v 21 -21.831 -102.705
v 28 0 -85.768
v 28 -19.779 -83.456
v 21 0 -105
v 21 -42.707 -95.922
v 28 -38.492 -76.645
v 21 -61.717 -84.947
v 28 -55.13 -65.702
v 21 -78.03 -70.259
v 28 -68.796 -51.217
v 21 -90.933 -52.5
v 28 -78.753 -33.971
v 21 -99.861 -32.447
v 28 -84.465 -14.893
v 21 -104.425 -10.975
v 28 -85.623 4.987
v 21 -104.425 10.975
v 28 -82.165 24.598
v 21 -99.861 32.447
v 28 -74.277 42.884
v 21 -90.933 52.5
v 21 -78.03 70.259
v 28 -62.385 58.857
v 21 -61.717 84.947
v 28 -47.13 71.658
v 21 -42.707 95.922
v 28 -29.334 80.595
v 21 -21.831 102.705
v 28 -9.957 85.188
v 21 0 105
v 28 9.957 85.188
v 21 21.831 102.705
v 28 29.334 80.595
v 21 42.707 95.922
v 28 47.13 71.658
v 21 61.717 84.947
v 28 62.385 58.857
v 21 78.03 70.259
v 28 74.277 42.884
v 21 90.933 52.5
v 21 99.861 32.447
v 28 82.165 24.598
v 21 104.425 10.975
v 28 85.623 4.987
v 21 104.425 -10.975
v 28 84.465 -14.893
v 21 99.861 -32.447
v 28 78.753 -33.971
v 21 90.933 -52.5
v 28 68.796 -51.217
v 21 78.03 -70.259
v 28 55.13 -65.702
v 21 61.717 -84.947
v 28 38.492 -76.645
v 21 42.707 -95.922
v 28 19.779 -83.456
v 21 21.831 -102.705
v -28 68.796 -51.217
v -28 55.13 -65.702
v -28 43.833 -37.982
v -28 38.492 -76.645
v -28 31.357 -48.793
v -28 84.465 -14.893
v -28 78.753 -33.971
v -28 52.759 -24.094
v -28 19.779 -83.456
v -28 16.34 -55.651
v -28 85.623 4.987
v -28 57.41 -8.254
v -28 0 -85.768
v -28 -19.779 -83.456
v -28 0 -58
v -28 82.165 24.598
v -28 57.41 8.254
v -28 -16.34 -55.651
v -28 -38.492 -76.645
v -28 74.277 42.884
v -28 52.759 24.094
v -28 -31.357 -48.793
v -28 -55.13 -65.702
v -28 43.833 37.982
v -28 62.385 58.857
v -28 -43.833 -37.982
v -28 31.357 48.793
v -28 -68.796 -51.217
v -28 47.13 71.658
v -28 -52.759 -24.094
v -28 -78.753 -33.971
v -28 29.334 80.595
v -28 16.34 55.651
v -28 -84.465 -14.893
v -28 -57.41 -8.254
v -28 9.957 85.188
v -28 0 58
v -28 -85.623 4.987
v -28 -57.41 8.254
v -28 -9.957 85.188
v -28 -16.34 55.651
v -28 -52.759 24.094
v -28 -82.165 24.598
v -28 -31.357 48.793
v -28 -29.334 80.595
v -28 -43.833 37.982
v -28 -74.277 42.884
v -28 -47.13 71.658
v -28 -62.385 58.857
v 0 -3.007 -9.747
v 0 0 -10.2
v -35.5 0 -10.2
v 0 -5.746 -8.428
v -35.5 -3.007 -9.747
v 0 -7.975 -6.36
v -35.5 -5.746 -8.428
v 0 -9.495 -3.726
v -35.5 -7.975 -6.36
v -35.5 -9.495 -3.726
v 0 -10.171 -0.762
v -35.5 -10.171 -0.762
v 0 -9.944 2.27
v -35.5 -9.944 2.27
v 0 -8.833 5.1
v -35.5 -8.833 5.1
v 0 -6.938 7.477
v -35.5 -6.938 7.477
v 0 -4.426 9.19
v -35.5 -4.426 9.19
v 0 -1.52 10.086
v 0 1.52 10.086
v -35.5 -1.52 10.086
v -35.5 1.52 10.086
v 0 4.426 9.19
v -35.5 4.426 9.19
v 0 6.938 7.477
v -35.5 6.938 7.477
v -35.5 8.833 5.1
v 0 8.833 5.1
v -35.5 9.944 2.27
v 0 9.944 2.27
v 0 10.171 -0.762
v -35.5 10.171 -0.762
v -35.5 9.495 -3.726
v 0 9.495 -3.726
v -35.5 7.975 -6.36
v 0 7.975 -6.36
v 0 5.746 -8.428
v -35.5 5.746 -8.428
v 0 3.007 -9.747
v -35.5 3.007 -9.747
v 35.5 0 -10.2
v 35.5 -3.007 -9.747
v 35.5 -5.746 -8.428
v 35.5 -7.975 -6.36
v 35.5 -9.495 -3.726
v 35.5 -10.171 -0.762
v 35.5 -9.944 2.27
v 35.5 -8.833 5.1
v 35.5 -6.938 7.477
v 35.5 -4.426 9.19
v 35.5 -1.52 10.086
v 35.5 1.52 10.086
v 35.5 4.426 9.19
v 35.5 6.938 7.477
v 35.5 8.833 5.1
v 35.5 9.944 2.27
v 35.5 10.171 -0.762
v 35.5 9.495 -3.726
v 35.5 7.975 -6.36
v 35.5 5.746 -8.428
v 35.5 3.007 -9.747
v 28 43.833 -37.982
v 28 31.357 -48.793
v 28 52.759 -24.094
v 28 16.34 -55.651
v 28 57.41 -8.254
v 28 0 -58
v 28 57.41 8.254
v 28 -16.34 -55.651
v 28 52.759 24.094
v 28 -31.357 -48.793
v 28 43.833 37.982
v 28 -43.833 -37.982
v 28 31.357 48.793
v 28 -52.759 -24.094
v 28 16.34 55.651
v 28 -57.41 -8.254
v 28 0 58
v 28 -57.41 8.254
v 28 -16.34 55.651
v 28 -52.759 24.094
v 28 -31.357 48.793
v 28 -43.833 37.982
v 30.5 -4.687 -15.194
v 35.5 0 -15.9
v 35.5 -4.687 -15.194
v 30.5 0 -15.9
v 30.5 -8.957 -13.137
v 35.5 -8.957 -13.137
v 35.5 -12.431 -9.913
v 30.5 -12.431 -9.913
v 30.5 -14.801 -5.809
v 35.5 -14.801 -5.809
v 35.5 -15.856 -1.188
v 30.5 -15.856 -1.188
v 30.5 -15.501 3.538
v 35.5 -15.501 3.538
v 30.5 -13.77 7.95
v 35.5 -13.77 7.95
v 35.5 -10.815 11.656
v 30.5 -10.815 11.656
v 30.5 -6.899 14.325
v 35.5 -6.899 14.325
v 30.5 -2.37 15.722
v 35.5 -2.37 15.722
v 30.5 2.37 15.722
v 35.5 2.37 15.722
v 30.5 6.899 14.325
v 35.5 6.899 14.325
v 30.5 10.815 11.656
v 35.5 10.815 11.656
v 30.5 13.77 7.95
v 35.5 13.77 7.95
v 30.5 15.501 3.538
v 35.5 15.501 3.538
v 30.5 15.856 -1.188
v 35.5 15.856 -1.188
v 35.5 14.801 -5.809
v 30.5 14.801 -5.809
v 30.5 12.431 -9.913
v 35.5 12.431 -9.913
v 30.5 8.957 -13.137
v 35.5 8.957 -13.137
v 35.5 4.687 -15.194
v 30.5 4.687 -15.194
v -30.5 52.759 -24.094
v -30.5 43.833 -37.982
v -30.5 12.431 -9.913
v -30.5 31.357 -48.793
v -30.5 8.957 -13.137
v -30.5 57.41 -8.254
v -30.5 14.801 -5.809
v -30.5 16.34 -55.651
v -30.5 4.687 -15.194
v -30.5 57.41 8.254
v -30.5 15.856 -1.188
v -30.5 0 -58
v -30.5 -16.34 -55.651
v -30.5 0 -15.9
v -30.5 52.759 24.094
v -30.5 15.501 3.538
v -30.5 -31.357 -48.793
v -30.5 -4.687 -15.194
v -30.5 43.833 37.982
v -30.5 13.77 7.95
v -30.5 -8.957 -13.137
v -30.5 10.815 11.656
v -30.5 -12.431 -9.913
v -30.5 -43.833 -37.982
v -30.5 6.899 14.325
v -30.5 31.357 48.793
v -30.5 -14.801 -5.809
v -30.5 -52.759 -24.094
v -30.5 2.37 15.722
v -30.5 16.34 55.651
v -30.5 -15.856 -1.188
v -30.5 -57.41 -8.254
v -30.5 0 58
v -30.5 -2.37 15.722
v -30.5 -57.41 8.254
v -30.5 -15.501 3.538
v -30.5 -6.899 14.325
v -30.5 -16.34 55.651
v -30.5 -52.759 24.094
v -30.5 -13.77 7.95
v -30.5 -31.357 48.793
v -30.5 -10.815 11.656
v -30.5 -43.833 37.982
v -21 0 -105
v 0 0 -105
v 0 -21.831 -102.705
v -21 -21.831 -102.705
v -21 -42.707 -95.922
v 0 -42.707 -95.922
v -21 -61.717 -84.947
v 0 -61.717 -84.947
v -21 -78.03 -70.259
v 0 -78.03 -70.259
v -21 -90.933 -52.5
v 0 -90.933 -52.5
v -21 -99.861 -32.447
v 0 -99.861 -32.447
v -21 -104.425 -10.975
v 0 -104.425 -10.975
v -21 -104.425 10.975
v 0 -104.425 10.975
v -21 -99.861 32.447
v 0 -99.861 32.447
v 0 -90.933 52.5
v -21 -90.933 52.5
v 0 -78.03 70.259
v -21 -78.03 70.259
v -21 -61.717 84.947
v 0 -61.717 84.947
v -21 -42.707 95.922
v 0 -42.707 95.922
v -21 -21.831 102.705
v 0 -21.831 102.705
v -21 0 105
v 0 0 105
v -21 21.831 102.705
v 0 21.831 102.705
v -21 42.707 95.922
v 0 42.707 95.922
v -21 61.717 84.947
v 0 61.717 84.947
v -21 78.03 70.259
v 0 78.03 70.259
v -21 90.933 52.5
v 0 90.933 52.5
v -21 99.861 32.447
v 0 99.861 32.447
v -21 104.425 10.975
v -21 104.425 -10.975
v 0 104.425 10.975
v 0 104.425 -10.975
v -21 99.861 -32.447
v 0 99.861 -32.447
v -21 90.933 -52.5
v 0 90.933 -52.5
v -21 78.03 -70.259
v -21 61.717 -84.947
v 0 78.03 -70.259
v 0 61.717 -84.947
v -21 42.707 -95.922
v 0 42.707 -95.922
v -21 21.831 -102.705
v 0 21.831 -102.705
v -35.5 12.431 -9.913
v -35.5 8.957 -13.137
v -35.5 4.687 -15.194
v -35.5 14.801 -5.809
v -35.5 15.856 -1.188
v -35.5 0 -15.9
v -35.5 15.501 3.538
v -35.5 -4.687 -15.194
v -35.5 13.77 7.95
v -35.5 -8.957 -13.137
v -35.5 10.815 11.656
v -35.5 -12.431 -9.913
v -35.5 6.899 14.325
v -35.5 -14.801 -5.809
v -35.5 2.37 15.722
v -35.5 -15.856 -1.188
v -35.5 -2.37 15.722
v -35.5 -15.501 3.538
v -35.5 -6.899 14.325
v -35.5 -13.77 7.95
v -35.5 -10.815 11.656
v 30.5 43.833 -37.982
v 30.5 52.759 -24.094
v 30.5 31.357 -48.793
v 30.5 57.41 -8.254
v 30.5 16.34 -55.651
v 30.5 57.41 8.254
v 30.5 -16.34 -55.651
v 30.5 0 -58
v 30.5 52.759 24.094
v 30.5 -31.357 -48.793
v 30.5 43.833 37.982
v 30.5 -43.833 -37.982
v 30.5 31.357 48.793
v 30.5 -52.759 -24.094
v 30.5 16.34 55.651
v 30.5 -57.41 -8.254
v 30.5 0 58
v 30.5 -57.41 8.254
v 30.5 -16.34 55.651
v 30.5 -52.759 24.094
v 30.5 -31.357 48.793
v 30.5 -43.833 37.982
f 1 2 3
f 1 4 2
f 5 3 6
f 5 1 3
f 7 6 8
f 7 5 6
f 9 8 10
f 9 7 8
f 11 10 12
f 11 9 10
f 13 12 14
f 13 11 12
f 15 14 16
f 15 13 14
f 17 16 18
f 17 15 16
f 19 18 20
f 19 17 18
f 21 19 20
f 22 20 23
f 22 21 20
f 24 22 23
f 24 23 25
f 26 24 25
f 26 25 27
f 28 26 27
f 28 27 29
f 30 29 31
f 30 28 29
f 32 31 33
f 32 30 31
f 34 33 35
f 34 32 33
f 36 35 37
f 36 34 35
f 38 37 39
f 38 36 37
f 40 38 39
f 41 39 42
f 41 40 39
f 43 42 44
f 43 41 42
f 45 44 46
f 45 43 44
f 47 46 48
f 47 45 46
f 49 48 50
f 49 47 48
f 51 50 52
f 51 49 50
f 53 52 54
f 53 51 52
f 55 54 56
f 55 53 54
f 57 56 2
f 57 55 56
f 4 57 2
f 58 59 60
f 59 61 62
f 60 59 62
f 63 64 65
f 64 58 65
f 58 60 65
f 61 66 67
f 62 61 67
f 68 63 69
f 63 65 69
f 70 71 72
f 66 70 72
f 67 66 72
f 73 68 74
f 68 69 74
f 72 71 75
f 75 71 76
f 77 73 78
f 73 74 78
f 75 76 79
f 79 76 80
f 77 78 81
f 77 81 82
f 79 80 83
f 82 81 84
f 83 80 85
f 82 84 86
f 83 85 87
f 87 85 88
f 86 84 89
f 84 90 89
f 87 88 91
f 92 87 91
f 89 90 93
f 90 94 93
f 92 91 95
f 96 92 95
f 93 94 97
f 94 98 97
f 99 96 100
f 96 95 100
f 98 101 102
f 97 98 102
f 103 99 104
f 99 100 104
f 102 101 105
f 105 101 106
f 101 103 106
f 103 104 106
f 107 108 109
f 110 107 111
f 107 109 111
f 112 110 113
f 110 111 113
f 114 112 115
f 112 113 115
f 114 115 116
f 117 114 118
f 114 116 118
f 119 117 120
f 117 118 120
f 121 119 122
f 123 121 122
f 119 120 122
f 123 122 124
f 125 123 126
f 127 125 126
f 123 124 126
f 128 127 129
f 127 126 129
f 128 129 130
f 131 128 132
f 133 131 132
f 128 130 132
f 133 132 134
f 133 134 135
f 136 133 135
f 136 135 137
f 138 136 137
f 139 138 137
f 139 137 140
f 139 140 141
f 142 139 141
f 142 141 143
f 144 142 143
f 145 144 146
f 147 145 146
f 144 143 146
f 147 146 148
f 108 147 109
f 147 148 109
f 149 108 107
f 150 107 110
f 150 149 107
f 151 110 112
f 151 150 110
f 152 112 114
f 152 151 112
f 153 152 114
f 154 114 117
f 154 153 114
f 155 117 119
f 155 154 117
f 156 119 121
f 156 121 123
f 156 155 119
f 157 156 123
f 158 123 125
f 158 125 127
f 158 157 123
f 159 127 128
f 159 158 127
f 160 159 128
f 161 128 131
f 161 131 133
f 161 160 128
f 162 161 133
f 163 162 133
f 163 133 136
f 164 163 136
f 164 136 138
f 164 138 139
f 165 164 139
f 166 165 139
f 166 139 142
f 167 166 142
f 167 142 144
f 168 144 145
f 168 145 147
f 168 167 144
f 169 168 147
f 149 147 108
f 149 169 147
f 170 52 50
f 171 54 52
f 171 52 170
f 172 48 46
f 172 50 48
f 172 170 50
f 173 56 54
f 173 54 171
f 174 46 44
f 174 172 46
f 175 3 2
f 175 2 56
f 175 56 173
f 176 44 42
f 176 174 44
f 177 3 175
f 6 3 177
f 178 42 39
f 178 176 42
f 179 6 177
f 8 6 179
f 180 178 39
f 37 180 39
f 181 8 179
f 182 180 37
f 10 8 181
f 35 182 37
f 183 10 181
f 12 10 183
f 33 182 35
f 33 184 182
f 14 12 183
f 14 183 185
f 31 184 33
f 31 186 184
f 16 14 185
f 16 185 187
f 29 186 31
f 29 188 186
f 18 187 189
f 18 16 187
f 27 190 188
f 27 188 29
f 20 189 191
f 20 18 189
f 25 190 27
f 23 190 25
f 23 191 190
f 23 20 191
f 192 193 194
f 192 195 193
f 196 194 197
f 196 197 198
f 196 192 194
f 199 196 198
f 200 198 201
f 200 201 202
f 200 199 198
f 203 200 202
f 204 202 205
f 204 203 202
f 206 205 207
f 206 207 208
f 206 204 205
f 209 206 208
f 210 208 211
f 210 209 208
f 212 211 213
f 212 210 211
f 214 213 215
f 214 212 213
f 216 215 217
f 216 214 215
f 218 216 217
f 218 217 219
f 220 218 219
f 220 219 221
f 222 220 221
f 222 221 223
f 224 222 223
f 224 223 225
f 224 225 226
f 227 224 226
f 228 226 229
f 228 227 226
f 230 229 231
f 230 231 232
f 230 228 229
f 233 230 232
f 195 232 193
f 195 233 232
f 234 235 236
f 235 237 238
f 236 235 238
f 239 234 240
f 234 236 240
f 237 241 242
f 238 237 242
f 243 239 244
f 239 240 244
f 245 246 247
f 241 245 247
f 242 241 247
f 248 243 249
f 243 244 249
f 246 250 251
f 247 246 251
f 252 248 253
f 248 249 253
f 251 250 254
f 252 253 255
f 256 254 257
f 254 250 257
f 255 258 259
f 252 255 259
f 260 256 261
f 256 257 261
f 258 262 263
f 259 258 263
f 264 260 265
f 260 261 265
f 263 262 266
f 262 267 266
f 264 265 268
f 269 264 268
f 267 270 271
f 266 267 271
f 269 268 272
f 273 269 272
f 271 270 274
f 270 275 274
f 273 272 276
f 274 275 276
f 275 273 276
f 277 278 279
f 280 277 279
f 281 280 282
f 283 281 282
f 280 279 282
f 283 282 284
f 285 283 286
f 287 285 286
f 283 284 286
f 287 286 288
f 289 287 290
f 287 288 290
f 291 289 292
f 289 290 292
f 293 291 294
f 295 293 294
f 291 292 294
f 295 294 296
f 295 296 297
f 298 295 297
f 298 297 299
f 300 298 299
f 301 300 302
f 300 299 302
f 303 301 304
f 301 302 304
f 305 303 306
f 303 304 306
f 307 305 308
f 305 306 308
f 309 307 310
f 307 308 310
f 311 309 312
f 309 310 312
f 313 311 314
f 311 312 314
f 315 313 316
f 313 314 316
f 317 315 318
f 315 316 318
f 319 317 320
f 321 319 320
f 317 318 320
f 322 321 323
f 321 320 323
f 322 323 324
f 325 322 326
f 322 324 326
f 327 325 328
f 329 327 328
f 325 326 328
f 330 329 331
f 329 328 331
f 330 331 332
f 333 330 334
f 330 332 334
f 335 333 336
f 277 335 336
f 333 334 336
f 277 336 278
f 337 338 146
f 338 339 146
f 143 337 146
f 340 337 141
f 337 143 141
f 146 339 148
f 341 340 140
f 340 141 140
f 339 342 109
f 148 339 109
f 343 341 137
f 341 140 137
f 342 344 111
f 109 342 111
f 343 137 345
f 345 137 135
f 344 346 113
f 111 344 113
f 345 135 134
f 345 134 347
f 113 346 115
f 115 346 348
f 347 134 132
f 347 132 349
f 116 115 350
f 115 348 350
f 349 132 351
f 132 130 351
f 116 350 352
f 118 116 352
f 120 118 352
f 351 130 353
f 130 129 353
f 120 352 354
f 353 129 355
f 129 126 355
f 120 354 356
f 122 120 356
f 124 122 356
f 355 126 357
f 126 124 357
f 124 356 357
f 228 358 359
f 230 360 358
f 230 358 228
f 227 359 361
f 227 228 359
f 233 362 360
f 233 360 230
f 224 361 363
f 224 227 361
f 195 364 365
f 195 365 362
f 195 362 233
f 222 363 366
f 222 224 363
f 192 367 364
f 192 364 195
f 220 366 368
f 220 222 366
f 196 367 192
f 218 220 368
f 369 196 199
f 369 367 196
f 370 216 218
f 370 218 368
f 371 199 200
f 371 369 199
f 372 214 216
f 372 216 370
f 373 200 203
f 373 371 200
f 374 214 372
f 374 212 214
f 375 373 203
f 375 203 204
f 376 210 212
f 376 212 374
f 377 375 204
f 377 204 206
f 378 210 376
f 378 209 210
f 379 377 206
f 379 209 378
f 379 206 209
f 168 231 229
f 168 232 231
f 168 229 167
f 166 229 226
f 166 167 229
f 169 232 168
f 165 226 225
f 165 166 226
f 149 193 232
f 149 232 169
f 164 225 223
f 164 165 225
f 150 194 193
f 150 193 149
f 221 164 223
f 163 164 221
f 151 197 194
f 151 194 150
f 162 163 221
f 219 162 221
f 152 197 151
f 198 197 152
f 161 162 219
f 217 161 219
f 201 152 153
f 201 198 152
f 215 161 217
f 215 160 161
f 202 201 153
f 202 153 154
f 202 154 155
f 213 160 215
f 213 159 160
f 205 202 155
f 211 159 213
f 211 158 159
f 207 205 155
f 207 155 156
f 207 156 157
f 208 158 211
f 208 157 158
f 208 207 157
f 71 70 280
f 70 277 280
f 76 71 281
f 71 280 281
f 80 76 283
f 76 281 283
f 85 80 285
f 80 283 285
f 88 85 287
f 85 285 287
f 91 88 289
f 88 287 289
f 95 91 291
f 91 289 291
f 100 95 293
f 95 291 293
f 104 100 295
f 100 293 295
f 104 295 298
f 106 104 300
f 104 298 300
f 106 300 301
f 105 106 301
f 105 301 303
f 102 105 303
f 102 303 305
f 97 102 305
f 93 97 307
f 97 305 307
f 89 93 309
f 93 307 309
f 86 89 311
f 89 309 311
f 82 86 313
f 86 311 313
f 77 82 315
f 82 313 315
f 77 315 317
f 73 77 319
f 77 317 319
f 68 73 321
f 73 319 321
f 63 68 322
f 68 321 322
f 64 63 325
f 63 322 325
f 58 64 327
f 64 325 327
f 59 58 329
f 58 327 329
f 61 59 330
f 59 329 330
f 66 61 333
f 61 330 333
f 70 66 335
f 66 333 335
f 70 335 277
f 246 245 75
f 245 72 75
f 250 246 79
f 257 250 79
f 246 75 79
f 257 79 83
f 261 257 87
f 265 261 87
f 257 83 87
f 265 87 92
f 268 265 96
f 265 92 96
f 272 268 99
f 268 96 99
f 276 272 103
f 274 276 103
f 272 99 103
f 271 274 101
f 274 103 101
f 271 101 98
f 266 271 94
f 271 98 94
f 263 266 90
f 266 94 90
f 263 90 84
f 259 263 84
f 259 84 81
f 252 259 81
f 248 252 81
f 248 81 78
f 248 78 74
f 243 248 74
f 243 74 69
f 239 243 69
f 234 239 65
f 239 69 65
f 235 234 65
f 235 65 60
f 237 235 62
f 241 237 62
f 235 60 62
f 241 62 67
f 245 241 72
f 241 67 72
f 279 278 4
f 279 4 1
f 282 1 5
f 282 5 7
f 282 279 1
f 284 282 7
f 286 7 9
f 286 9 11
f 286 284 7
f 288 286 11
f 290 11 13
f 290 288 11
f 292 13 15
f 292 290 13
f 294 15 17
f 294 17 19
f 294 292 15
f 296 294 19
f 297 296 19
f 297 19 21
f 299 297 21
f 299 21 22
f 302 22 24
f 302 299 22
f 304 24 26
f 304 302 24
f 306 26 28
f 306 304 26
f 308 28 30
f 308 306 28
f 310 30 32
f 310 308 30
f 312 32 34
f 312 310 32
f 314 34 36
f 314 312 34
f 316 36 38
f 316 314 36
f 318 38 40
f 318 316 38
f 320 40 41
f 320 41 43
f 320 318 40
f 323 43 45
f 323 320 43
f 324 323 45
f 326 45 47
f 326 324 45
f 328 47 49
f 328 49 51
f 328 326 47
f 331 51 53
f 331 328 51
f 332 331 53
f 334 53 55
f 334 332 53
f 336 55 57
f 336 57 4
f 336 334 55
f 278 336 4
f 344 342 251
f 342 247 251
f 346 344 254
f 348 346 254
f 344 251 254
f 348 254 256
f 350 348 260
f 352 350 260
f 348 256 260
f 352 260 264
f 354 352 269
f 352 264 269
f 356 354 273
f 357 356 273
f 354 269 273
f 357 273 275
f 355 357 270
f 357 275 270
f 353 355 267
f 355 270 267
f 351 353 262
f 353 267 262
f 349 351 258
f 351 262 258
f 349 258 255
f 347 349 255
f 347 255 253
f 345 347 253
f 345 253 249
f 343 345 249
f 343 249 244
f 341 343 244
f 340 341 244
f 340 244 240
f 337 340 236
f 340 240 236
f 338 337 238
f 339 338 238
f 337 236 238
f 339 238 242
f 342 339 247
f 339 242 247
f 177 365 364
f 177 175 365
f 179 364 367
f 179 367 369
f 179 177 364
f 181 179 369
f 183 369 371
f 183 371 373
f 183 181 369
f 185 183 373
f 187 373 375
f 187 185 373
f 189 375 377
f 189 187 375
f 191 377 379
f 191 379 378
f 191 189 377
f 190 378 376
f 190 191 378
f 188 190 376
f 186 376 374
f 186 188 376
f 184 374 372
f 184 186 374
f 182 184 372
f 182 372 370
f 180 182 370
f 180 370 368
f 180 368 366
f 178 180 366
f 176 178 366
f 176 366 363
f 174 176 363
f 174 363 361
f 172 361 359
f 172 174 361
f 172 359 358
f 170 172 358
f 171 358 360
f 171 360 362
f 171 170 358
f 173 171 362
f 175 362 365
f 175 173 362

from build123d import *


with BuildPart() as part:
    # Szkic2 → Obrót1 (revolve)
    with BuildSketch(Plane.XY, mode=Mode.PRIVATE) as obr_t1_sk:
        Polygon((0, 10.2), (-35.5, 10.2), (-35.5, 15.9), (-30.5, 15.9), (-30.5, 58), (-28, 58), (-28, 85.767658064), (-21, 105), (0, 105), align=None)
    obr_t1 = revolve(obr_t1_sk.sketch.rotate(Axis((0, 0, 0), (-1, 0, 0)), 90), axis=Axis((0, 0, 0), (-1, 0, 0)))

    # Lustro2: Obrót1 across Right Plane
    add(obr_t1.mirror(Plane(origin=(0, 0, 0), x_dir=(0, 0, -1), z_dir=(1, 0, 0))))


solid = part.part
